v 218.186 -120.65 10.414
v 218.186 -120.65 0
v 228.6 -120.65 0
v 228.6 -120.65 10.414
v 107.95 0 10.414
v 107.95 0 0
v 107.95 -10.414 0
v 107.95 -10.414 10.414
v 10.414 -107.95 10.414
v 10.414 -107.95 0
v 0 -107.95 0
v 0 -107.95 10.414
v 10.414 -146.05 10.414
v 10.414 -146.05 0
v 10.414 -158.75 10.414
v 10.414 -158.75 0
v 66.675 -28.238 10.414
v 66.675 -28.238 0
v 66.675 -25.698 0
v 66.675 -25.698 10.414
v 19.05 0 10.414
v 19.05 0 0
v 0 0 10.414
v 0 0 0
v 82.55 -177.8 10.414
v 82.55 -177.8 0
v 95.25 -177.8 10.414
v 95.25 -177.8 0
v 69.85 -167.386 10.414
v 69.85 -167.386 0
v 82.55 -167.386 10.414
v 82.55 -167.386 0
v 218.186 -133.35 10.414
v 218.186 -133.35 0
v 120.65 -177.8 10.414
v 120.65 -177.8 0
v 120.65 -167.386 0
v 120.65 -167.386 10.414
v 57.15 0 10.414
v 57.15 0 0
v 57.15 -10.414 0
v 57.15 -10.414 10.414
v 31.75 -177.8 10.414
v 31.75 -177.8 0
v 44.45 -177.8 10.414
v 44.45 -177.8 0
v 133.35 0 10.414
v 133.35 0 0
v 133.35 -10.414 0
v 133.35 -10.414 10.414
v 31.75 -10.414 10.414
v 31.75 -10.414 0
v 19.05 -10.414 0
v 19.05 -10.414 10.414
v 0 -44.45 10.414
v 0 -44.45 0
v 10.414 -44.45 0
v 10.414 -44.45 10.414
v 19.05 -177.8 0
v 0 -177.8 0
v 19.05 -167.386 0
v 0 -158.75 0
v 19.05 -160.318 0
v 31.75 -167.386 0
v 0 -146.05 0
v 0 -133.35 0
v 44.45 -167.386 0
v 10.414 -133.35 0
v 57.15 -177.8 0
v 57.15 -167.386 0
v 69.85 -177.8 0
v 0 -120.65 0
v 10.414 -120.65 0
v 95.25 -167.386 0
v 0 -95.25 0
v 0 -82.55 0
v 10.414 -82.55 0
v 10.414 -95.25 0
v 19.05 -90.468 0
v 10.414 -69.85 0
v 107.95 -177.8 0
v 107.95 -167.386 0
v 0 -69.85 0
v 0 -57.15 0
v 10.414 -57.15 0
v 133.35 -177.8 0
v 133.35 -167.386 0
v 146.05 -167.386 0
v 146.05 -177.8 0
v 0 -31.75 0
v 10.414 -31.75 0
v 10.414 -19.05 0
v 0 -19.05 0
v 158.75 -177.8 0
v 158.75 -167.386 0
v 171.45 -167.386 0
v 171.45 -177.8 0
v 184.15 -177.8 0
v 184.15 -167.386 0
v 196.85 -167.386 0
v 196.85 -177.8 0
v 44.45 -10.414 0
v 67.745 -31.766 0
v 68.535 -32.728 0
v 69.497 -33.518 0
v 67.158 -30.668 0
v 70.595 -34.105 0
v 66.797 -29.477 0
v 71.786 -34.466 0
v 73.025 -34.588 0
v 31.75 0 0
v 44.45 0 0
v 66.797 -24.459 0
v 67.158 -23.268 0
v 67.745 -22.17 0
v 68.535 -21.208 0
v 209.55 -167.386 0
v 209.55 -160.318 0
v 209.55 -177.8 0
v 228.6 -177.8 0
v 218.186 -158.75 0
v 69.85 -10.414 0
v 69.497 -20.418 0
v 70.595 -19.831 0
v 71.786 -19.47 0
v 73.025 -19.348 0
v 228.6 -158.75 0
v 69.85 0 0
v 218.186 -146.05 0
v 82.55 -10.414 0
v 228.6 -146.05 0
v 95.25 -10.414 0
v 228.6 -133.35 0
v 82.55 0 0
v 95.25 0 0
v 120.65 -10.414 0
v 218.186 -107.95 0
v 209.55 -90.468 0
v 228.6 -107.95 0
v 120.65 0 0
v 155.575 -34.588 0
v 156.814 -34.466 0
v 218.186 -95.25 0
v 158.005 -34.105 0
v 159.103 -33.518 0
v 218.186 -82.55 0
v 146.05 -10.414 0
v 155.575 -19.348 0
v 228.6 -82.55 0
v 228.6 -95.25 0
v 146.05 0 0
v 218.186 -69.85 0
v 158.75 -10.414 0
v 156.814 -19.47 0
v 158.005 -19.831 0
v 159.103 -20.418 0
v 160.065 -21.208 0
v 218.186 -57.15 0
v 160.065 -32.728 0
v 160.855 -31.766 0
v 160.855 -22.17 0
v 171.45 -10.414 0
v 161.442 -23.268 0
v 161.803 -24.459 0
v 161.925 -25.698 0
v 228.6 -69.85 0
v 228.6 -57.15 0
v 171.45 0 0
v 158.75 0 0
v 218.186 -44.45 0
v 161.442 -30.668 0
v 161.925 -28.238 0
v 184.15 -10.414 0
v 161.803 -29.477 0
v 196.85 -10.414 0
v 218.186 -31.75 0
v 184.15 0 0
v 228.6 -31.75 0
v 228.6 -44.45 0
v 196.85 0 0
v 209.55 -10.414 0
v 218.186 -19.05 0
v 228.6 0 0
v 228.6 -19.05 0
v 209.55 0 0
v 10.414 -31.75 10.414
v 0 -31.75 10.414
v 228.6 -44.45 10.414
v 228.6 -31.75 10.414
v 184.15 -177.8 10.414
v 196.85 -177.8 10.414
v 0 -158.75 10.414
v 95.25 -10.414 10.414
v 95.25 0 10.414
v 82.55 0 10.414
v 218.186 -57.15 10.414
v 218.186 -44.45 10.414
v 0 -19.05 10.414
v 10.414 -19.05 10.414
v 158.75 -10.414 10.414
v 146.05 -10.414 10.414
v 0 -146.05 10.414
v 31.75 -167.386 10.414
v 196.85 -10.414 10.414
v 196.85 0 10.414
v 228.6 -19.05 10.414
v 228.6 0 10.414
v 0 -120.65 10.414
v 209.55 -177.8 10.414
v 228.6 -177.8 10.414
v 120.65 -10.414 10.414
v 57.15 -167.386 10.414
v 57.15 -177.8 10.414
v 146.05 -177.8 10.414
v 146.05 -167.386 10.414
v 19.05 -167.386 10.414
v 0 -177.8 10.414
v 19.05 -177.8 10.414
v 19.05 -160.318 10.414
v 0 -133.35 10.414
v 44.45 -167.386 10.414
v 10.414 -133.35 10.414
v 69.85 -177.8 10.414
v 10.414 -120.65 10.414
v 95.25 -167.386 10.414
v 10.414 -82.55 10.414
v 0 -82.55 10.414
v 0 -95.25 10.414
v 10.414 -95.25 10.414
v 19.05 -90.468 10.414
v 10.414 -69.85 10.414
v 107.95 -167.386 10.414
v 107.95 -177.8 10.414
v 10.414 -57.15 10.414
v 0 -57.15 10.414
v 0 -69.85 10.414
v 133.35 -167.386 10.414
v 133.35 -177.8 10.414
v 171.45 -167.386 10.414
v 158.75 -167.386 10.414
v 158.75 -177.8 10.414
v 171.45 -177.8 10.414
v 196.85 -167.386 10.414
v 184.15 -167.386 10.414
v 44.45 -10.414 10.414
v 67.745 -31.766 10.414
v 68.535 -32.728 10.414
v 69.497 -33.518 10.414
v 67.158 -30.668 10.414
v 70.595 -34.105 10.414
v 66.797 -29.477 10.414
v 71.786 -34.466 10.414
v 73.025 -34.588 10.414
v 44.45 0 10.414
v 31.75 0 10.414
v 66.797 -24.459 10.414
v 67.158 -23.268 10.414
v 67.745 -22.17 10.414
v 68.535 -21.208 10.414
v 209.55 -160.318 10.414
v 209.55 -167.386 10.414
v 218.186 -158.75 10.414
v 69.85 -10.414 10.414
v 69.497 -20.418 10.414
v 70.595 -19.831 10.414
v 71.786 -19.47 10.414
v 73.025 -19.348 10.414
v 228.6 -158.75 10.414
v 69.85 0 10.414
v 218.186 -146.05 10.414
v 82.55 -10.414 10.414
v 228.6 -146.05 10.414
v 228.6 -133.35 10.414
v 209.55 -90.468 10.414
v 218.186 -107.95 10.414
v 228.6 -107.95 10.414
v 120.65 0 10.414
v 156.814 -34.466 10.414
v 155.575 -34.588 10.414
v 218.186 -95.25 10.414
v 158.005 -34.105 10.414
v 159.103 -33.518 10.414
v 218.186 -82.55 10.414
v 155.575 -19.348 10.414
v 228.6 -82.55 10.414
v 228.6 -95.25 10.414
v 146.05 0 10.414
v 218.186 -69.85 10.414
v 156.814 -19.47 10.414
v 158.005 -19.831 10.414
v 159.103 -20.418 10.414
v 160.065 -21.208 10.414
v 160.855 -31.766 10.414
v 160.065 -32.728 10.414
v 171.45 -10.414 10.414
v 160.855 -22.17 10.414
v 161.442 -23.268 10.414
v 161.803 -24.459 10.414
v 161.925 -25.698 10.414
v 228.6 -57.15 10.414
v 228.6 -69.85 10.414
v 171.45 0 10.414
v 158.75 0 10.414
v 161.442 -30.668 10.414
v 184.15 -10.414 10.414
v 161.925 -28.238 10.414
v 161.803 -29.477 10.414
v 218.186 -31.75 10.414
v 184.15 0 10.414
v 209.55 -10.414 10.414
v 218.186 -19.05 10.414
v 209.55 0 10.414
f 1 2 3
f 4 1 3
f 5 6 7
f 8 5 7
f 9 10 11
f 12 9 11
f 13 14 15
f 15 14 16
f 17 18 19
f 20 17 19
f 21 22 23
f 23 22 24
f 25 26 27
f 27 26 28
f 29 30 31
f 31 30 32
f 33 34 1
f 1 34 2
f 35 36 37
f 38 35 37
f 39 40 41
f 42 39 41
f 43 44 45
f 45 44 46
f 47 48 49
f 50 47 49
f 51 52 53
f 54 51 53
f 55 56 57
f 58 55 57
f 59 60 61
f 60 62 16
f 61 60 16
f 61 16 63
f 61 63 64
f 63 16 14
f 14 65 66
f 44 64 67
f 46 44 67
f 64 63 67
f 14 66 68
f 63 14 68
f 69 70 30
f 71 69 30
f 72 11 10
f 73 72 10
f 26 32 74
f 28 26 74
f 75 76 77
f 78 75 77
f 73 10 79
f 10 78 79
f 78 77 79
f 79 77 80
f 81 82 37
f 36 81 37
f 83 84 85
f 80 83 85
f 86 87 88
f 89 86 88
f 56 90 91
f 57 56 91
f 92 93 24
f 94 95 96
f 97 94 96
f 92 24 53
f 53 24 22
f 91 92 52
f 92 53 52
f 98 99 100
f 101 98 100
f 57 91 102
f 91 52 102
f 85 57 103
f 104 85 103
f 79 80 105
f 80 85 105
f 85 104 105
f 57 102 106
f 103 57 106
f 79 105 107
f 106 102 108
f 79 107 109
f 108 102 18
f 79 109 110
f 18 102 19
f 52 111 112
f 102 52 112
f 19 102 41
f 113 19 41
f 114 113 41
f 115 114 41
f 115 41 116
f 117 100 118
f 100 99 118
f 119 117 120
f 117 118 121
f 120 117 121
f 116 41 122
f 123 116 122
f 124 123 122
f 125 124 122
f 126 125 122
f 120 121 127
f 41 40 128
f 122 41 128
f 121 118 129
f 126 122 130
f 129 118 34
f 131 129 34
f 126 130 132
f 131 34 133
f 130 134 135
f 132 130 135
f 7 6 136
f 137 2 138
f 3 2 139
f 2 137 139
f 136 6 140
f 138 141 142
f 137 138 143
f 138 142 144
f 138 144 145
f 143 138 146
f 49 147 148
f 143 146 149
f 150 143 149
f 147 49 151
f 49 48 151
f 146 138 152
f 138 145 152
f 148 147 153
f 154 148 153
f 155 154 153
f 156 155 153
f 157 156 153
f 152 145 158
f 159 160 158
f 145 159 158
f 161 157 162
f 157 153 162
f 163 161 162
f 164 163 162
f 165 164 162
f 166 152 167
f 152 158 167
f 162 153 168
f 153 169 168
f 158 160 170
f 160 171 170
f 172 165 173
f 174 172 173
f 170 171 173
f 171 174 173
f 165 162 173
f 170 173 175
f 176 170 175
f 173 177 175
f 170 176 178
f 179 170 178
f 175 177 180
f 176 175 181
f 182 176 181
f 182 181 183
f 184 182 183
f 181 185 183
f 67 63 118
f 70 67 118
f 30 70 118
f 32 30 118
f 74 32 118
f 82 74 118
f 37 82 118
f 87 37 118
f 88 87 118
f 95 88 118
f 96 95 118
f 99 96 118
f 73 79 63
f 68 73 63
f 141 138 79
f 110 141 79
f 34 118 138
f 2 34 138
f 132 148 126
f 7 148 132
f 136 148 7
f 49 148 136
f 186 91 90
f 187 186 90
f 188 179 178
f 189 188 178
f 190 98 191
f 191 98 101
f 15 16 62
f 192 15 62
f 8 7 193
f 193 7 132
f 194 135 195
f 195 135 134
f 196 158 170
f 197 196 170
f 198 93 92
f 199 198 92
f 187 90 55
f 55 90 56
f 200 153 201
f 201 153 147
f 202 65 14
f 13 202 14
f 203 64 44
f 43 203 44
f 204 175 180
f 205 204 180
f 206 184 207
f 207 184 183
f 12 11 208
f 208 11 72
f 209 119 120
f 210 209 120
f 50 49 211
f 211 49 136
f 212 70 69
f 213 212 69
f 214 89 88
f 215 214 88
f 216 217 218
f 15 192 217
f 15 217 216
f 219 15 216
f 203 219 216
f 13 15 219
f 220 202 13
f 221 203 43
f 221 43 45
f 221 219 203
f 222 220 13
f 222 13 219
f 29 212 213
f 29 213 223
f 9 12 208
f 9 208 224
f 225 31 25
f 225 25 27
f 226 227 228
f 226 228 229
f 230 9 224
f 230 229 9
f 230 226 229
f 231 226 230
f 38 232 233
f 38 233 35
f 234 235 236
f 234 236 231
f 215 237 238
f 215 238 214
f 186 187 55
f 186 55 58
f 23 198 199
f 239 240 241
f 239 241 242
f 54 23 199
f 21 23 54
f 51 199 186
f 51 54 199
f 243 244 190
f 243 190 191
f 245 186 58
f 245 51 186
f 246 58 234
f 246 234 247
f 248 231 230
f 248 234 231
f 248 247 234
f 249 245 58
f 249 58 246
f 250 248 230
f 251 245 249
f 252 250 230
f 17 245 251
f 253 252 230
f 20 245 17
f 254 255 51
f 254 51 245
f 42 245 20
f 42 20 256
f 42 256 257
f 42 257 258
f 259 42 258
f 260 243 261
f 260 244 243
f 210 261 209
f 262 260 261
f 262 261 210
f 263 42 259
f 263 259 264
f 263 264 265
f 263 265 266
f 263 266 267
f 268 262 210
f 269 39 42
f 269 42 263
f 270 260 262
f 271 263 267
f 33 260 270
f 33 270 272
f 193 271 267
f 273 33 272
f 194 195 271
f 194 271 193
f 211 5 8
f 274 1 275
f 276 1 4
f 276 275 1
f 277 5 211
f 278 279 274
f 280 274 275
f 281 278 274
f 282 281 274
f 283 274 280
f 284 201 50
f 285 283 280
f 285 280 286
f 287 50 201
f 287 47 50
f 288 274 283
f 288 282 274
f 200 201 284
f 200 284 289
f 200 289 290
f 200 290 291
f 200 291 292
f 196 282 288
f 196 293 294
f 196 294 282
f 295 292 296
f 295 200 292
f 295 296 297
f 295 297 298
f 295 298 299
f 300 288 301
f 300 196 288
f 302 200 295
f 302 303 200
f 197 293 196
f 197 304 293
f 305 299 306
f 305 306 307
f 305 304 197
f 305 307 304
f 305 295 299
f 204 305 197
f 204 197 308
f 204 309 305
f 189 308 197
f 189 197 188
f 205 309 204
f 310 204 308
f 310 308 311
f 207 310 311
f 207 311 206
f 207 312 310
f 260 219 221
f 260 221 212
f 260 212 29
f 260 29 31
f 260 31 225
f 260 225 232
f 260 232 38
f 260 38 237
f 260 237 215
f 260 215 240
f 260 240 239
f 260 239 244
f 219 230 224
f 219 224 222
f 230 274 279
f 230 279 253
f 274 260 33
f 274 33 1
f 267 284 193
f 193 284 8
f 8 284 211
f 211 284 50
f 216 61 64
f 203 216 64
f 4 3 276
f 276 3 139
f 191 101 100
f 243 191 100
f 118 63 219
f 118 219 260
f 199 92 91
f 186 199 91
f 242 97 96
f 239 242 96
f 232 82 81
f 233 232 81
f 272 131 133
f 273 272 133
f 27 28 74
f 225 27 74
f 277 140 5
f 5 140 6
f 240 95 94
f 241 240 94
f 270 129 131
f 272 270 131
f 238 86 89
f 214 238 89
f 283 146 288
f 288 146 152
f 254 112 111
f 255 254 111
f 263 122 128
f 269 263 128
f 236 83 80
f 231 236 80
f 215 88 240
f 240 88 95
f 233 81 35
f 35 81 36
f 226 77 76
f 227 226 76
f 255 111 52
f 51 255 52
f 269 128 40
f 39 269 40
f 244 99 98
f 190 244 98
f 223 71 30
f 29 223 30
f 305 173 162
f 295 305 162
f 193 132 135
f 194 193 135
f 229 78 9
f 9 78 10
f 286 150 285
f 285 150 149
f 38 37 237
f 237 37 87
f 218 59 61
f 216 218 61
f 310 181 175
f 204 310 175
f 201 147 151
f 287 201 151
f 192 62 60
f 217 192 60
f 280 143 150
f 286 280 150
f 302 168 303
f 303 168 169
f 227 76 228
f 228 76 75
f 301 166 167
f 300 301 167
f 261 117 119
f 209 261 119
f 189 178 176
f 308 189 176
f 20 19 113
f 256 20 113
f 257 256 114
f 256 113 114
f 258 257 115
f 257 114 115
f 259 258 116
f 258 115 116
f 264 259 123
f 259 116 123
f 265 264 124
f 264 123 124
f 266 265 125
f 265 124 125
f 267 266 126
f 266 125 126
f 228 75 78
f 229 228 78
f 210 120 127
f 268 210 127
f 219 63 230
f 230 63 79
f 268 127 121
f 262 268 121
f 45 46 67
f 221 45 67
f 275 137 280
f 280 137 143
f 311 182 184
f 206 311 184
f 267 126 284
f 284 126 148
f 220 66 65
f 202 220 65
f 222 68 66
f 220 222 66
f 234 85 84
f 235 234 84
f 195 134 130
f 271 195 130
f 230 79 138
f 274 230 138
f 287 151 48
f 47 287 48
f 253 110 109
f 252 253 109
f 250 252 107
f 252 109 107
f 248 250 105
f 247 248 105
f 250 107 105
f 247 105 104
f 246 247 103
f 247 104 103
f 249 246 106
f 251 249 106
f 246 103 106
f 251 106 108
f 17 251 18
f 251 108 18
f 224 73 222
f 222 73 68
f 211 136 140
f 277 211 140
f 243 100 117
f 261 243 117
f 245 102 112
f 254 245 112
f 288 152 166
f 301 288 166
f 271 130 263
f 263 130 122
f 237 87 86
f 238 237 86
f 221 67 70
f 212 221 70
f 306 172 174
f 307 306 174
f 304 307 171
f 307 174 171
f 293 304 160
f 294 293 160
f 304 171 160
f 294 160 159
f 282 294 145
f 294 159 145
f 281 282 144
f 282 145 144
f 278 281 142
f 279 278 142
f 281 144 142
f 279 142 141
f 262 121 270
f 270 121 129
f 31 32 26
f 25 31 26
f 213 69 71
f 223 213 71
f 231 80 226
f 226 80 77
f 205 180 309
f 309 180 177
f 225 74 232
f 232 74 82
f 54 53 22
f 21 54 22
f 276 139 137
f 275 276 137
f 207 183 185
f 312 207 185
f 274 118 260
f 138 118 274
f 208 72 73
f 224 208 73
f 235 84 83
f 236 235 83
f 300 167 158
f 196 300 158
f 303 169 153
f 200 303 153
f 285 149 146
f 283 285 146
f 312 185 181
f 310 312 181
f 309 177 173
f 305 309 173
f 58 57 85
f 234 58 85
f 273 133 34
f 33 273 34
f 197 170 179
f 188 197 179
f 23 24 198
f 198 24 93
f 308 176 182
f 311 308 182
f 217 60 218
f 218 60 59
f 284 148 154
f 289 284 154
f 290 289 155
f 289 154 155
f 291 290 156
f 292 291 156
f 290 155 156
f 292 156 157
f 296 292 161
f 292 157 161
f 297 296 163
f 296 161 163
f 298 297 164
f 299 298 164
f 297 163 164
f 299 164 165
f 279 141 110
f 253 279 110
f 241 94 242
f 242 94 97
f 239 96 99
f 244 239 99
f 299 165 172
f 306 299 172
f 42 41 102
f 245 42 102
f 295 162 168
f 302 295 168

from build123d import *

# Parameters (mm, degrees)
F0_W     = 190.5
F0_H     = 69.85
F1_DEPTH = 10.414


with BuildPart() as f1:
    # F0 (on Top) → F1 (new body)
    with BuildSketch(Plane.XY):
        Polygon((19.05, 0), (0, 0), (0, -19.05), (10.414, -19.05), (10.414, -31.75), (0, -31.75), (0, -44.45), (10.414, -44.45), (10.414, -57.15), (0, -57.15), (0, -69.85), (10.414, -69.85), (10.414, -82.55), (0, -82.55), (0, -95.25), (10.414, -95.25), (10.414, -107.95), (0, -107.95), (0, -120.65), (10.414, -120.65), (10.414, -133.35), (0, -133.35), (0, -146.05), (10.414, -146.05), (10.414, -158.75), (0, -158.75), (0, -177.8), (19.05, -177.8), (19.05, -167.386), (31.75, -167.386), (31.75, -177.8), (44.45, -177.8), (44.45, -167.386), (57.15, -167.386), (57.15, -177.8), (69.85, -177.8), (69.85, -167.386), (82.55, -167.386), (82.55, -177.8), (95.25, -177.8), (95.25, -167.386), (107.95, -167.386), (107.95, -177.8), (120.65, -177.8), (120.65, -167.386), (133.35, -167.386), (133.35, -177.8), (146.05, -177.8), (146.05, -167.386), (158.75, -167.386), (158.75, -177.8), (171.45, -177.8), (171.45, -167.386), (184.15, -167.386), (184.15, -177.8), (196.85, -177.8), (196.85, -167.386), (209.55, -167.386), (209.55, -177.8), (228.6, -177.8), (228.6, -158.75), (218.186, -158.75), (218.186, -146.05), (228.6, -146.05), (228.6, -133.35), (218.186, -133.35), (218.186, -120.65), (228.6, -120.65), (228.6, -107.95), (218.186, -107.95), (218.186, -95.25), (228.6, -95.25), (228.6, -82.55), (218.186, -82.55), (218.186, -69.85), (228.6, -69.85), (228.6, -57.15), (218.186, -57.15), (218.186, -44.45), (228.6, -44.45), (228.6, -31.75), (218.186, -31.75), (218.186, -19.05), (228.6, -19.05), (228.6, 0), (209.55, 0), (209.55, -10.414), (196.85, -10.414), (196.85, 0), (184.15, 0), (184.15, -10.414), (171.45, -10.414), (171.45, 0), (158.75, 0), (158.75, -10.414), (146.05, -10.414), (146.05, 0), (133.35, 0), (133.35, -10.414), (120.65, -10.414), (120.65, 0), (107.95, 0), (107.95, -10.414), (95.25, -10.414), (95.25, 0), (82.55, 0), (82.55, -10.414), (69.85, -10.414), (69.85, 0), (57.15, 0), (57.15, -10.414), (44.45, -10.414), (44.45, 0), (31.75, 0), (31.75, -10.414), (19.05, -10.414), align=None)
        with Locations((114.3, -125.392927)):
            Rectangle(F0_W, F0_H, mode=Mode.SUBTRACT)
        with BuildLine():
            ThreePointArc((66.675, -25.697927), (68.534872, -21.207799), (73.025, -19.347927))
            Line((73.025, -19.347927), (155.575, -19.347927))
            ThreePointArc((155.575, -19.347927), (160.065128, -21.207799), (161.925, -25.697927))
            Line((161.925, -25.697927), (161.925, -28.237927))
            ThreePointArc((161.925, -28.237927), (160.065128, -32.728055), (155.575, -34.587927))
            Line((155.575, -34.587927), (73.025, -34.587927))
            ThreePointArc((73.025, -34.587927), (68.534872, -32.728055), (66.675, -28.237927))
            Line((66.675, -28.237927), (66.675, -25.697927))
        make_face(mode=Mode.SUBTRACT)
    extrude(amount=F1_DEPTH)


solid = f1.part
